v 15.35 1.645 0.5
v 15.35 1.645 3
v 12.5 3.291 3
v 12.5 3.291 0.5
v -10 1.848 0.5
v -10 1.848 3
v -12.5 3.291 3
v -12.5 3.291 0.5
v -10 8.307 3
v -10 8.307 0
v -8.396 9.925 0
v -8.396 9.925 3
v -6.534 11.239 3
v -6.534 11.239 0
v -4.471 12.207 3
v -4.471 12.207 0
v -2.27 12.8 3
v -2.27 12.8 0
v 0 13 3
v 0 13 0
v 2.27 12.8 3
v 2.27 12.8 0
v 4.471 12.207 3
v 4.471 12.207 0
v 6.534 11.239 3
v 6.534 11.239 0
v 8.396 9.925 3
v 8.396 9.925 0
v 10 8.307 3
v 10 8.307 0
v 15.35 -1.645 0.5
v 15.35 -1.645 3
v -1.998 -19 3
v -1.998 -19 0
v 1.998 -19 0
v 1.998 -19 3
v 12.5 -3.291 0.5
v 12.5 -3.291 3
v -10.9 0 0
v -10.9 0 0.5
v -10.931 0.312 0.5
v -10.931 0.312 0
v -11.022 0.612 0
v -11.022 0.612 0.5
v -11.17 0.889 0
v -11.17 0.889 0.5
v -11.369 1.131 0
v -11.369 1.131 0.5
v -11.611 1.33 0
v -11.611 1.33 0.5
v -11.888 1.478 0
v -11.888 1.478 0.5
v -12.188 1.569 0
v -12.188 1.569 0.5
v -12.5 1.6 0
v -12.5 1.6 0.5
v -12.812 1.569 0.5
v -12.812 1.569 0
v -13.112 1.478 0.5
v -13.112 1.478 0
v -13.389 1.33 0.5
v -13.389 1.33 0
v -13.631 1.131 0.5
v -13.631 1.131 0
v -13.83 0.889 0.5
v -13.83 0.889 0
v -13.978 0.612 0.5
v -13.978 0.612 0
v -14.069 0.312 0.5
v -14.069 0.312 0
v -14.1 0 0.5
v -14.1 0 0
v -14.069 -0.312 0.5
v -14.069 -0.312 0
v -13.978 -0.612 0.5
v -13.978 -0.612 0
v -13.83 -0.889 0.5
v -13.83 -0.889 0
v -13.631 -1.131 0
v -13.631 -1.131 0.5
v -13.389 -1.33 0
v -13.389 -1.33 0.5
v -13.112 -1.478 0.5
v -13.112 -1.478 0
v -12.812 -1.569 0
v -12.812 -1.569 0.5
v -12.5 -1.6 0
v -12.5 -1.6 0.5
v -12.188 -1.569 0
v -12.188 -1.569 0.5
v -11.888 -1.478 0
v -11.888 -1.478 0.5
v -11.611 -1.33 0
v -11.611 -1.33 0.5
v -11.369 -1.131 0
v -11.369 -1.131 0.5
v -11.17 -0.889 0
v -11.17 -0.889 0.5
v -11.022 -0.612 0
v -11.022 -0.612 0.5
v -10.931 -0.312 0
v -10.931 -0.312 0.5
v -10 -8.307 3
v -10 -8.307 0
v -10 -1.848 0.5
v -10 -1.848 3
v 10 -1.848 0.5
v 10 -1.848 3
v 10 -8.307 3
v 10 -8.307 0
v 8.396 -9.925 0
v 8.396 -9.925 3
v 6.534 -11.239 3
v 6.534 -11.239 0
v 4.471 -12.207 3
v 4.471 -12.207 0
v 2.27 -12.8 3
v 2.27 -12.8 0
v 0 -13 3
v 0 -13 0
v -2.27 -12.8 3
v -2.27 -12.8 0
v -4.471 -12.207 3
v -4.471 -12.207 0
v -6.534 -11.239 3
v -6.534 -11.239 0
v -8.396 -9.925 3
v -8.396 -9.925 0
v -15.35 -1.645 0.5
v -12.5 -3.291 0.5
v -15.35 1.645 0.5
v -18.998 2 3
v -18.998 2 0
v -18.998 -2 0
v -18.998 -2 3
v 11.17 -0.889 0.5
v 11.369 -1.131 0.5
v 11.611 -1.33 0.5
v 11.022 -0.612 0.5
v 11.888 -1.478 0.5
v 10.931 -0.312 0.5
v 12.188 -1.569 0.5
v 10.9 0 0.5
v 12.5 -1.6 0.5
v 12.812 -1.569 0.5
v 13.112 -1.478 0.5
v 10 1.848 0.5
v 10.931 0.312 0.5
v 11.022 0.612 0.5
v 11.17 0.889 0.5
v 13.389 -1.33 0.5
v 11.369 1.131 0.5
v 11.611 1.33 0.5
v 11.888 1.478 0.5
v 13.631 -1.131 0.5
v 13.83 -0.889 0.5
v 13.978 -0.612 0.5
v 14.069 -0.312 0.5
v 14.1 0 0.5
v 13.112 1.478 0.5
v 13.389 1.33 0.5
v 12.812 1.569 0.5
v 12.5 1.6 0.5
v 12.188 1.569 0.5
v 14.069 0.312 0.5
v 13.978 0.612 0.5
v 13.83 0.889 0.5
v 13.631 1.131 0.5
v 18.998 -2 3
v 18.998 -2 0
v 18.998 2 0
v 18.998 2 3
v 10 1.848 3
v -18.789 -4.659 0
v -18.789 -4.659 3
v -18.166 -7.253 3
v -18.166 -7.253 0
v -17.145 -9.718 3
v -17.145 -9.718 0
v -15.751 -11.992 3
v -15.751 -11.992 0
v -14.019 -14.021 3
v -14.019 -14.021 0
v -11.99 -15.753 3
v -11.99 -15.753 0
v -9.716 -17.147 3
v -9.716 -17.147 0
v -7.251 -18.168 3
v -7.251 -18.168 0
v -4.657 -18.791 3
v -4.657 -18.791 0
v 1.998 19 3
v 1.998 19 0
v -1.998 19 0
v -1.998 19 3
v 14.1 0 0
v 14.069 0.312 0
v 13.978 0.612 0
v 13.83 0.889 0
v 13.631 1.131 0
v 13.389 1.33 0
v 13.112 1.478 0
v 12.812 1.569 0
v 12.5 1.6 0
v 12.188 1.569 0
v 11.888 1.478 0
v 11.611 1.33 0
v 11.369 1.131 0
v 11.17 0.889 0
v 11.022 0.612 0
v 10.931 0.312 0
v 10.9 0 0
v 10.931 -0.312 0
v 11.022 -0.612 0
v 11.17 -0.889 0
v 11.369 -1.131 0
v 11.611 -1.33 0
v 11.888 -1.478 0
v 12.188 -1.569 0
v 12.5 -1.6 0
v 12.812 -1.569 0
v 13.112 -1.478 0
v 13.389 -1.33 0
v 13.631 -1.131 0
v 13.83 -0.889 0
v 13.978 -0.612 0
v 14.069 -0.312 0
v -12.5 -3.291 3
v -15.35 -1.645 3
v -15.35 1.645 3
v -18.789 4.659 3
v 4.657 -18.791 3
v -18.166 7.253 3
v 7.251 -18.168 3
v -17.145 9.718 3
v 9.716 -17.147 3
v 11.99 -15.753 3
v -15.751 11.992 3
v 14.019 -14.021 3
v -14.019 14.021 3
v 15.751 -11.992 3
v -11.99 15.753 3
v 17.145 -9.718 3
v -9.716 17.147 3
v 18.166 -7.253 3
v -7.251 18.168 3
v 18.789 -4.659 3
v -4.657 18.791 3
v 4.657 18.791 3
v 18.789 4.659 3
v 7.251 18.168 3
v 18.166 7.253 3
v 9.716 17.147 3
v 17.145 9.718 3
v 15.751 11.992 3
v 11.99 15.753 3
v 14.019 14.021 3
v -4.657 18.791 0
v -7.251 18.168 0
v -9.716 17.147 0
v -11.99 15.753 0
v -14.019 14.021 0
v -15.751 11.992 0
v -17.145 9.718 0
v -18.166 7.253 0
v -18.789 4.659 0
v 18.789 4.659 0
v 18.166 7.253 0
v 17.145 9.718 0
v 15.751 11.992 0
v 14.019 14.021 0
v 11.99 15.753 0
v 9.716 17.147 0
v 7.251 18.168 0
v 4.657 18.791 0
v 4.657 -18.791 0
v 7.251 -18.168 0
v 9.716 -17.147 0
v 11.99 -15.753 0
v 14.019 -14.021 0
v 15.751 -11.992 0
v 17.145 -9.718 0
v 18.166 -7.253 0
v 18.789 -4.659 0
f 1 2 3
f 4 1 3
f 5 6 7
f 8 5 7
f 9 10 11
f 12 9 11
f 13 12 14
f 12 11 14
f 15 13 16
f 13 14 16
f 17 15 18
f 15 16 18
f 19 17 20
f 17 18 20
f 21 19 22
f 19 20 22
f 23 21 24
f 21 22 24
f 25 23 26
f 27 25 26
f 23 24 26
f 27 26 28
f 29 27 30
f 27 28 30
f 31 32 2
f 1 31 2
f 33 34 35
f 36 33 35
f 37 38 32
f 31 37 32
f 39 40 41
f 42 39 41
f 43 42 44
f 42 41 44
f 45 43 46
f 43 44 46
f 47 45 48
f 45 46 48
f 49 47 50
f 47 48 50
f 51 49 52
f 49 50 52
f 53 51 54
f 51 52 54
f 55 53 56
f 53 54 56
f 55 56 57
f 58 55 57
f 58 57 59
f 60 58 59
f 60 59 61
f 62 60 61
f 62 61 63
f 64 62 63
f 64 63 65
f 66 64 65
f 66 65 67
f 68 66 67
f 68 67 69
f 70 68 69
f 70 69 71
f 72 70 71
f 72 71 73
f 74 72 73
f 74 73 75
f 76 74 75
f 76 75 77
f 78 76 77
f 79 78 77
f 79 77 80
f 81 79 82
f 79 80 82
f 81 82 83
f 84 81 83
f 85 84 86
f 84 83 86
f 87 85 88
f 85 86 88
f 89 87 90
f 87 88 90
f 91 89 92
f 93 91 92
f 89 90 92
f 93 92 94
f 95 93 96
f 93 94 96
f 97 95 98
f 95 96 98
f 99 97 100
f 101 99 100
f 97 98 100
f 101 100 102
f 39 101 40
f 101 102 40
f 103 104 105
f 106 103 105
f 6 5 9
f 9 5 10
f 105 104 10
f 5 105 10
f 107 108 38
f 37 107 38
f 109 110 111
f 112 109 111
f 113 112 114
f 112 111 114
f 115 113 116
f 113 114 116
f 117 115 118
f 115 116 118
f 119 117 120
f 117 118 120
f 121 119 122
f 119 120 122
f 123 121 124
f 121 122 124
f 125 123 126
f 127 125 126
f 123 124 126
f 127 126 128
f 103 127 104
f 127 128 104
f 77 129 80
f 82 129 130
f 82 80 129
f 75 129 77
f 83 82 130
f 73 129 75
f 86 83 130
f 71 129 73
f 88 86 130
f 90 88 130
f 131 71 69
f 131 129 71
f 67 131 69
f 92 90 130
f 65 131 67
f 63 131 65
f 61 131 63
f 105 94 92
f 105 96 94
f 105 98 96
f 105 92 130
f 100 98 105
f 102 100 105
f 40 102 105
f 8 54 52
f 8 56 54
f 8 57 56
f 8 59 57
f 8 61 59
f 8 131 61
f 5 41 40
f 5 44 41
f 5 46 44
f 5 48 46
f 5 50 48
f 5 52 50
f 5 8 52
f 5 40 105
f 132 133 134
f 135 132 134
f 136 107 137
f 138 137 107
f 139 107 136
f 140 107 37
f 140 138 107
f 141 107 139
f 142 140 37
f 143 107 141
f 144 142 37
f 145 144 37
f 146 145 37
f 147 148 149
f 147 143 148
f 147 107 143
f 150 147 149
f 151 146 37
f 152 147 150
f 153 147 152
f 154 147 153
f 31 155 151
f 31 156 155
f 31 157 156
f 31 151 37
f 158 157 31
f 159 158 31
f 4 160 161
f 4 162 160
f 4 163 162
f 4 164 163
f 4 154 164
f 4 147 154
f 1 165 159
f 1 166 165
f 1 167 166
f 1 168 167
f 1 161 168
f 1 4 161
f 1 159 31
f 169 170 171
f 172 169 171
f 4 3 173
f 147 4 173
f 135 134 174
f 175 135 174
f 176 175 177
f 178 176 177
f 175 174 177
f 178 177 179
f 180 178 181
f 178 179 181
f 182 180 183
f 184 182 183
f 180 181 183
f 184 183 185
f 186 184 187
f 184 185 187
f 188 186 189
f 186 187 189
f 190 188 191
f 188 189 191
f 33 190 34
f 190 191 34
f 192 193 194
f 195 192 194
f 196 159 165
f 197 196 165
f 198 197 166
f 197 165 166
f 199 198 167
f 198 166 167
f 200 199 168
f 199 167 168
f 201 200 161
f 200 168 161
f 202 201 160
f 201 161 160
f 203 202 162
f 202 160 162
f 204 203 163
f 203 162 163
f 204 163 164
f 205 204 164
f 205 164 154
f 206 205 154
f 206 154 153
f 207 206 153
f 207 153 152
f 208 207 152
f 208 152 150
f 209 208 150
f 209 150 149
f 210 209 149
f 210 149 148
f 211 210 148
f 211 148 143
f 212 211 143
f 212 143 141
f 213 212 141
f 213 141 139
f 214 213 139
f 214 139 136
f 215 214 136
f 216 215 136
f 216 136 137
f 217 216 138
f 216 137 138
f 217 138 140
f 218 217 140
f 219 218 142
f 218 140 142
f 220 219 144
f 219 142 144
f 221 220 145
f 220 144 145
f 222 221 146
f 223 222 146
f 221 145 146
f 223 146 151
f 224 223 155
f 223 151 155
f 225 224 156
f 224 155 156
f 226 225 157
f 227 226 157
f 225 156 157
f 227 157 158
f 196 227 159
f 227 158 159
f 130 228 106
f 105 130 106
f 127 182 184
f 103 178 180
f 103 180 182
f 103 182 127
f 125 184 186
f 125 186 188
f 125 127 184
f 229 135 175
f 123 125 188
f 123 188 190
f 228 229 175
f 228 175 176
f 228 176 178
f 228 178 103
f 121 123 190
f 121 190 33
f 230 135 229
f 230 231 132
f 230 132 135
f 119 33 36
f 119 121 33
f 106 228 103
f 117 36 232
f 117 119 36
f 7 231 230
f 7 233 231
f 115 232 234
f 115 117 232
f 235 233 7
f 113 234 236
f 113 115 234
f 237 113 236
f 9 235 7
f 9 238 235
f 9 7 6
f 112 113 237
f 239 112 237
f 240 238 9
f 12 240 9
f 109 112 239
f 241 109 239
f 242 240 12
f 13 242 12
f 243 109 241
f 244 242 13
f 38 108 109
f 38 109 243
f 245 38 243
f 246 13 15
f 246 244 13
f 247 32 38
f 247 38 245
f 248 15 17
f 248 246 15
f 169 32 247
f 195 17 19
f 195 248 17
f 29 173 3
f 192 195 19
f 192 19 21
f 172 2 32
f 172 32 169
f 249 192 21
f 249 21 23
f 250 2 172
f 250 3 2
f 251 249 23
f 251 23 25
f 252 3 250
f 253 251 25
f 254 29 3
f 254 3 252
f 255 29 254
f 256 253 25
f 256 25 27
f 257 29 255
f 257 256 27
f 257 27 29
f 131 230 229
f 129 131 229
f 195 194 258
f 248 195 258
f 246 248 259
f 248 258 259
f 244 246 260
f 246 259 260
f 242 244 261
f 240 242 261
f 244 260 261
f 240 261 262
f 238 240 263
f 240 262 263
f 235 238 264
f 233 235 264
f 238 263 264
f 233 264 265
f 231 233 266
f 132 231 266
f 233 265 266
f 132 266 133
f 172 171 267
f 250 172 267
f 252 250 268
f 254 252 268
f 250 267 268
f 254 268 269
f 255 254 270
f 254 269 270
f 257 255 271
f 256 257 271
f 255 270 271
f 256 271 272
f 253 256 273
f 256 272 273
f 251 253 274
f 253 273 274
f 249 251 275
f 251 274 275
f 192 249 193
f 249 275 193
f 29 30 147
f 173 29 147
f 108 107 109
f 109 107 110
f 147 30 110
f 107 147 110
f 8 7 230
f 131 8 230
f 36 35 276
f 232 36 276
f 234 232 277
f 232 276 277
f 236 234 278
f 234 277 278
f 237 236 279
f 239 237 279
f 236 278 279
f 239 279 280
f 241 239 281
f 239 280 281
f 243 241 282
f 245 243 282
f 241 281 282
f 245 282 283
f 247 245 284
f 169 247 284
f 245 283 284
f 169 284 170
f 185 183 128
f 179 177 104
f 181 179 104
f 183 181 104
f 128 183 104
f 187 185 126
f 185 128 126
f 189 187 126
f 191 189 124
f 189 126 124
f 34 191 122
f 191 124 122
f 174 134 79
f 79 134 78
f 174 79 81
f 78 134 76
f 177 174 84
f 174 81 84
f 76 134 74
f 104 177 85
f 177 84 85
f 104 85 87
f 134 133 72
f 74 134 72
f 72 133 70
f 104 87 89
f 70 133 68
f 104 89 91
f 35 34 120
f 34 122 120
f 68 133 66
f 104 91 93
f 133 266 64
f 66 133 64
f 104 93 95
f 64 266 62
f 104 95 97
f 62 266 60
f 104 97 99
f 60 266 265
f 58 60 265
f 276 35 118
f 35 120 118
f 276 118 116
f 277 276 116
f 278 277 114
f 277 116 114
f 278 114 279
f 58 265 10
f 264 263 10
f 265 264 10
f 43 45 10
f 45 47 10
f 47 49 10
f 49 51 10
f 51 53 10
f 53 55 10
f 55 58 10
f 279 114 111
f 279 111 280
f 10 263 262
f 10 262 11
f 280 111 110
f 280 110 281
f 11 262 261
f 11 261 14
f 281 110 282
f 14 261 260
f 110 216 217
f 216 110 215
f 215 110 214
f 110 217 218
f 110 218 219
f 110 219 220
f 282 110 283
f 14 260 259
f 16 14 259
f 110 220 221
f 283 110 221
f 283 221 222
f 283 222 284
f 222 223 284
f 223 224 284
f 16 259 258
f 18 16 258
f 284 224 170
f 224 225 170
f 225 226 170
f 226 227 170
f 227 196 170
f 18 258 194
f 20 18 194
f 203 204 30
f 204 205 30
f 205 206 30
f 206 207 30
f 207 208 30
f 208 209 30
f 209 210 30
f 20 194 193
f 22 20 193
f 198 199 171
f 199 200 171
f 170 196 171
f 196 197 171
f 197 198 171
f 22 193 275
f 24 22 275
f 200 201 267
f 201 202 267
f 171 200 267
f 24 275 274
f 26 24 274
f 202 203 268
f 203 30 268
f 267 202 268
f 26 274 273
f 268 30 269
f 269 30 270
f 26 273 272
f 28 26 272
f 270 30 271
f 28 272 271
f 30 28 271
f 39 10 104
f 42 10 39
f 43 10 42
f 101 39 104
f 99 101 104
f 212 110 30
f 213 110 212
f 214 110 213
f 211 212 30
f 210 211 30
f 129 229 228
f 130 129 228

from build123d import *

# Parameters (mm, degrees)
BOSS_EXTRUDE5_DEPTH = 3
SKETCH2_R           = 1.6
CUT_EXTRUDE2_DEPTH  = 4
CUT_EXTRUDE3_DEPTH  = 2.5


with BuildPart() as part:
    # Sketch1 → Boss-Extrude5 (new body)
    with BuildSketch(Plane.XY):
        with BuildLine():
            Line((-1.997893001, -19), (1.997893001, -19))
            ThreePointArc((1.997893001, -19), (14.018708281, -14.02081528), (18.997893001, -2))
            Line((18.997893001, -2), (18.997893001, 2))
            ThreePointArc((18.997893001, 2), (14.018708281, 14.02081528), (1.997893001, 19))
            Line((1.997893001, 19), (-1.997893001, 19))
            ThreePointArc((-1.997893001, 19), (-14.018708281, 14.02081528), (-18.997893001, 2))
            Line((-18.997893001, 2), (-18.997893001, -2))
            ThreePointArc((-18.997893001, -2), (-14.018708281, -14.02081528), (-1.997893001, -19))
        make_face()
        with BuildLine():
            Line((-10, -8.306623863), (-10, 8.306623863))
            ThreePointArc((-10, 8.306623863), (0, 13), (10, 8.306623863))
            Line((10, 8.306623863), (10, -8.306623863))
            ThreePointArc((10, -8.306623863), (0, -13), (-10, -8.306623863))
        make_face(mode=Mode.SUBTRACT)
    extrude(amount=BOSS_EXTRUDE5_DEPTH)

    # Sketch2 → Cut-Extrude2 (cut, through all)
    with BuildSketch(Plane.XY.offset(3)):
        with Locations((-12.5, 0)):
            Circle(SKETCH2_R)
        with Locations((12.5, 0)):
            Circle(SKETCH2_R)
    extrude(amount=-CUT_EXTRUDE2_DEPTH, mode=Mode.SUBTRACT)

    # Sketch3 → Cut-Extrude3 (cut)
    with BuildSketch(Plane.XY.offset(3)):
        Polygon((-12.5, 3.290896534), (-15.35, 1.645448267), (-15.35, -1.645448267), (-12.5, -3.290896534), (-9.65, -1.645448267), (-9.65, 1.645448267), align=None)
        Polygon((12.5, 3.290896534), (9.65, 1.645448267), (9.65, -1.645448267), (12.5, -3.290896534), (15.35, -1.645448267), (15.35, 1.645448267), align=None)
    extrude(amount=-CUT_EXTRUDE3_DEPTH, mode=Mode.SUBTRACT)


solid = part.part
